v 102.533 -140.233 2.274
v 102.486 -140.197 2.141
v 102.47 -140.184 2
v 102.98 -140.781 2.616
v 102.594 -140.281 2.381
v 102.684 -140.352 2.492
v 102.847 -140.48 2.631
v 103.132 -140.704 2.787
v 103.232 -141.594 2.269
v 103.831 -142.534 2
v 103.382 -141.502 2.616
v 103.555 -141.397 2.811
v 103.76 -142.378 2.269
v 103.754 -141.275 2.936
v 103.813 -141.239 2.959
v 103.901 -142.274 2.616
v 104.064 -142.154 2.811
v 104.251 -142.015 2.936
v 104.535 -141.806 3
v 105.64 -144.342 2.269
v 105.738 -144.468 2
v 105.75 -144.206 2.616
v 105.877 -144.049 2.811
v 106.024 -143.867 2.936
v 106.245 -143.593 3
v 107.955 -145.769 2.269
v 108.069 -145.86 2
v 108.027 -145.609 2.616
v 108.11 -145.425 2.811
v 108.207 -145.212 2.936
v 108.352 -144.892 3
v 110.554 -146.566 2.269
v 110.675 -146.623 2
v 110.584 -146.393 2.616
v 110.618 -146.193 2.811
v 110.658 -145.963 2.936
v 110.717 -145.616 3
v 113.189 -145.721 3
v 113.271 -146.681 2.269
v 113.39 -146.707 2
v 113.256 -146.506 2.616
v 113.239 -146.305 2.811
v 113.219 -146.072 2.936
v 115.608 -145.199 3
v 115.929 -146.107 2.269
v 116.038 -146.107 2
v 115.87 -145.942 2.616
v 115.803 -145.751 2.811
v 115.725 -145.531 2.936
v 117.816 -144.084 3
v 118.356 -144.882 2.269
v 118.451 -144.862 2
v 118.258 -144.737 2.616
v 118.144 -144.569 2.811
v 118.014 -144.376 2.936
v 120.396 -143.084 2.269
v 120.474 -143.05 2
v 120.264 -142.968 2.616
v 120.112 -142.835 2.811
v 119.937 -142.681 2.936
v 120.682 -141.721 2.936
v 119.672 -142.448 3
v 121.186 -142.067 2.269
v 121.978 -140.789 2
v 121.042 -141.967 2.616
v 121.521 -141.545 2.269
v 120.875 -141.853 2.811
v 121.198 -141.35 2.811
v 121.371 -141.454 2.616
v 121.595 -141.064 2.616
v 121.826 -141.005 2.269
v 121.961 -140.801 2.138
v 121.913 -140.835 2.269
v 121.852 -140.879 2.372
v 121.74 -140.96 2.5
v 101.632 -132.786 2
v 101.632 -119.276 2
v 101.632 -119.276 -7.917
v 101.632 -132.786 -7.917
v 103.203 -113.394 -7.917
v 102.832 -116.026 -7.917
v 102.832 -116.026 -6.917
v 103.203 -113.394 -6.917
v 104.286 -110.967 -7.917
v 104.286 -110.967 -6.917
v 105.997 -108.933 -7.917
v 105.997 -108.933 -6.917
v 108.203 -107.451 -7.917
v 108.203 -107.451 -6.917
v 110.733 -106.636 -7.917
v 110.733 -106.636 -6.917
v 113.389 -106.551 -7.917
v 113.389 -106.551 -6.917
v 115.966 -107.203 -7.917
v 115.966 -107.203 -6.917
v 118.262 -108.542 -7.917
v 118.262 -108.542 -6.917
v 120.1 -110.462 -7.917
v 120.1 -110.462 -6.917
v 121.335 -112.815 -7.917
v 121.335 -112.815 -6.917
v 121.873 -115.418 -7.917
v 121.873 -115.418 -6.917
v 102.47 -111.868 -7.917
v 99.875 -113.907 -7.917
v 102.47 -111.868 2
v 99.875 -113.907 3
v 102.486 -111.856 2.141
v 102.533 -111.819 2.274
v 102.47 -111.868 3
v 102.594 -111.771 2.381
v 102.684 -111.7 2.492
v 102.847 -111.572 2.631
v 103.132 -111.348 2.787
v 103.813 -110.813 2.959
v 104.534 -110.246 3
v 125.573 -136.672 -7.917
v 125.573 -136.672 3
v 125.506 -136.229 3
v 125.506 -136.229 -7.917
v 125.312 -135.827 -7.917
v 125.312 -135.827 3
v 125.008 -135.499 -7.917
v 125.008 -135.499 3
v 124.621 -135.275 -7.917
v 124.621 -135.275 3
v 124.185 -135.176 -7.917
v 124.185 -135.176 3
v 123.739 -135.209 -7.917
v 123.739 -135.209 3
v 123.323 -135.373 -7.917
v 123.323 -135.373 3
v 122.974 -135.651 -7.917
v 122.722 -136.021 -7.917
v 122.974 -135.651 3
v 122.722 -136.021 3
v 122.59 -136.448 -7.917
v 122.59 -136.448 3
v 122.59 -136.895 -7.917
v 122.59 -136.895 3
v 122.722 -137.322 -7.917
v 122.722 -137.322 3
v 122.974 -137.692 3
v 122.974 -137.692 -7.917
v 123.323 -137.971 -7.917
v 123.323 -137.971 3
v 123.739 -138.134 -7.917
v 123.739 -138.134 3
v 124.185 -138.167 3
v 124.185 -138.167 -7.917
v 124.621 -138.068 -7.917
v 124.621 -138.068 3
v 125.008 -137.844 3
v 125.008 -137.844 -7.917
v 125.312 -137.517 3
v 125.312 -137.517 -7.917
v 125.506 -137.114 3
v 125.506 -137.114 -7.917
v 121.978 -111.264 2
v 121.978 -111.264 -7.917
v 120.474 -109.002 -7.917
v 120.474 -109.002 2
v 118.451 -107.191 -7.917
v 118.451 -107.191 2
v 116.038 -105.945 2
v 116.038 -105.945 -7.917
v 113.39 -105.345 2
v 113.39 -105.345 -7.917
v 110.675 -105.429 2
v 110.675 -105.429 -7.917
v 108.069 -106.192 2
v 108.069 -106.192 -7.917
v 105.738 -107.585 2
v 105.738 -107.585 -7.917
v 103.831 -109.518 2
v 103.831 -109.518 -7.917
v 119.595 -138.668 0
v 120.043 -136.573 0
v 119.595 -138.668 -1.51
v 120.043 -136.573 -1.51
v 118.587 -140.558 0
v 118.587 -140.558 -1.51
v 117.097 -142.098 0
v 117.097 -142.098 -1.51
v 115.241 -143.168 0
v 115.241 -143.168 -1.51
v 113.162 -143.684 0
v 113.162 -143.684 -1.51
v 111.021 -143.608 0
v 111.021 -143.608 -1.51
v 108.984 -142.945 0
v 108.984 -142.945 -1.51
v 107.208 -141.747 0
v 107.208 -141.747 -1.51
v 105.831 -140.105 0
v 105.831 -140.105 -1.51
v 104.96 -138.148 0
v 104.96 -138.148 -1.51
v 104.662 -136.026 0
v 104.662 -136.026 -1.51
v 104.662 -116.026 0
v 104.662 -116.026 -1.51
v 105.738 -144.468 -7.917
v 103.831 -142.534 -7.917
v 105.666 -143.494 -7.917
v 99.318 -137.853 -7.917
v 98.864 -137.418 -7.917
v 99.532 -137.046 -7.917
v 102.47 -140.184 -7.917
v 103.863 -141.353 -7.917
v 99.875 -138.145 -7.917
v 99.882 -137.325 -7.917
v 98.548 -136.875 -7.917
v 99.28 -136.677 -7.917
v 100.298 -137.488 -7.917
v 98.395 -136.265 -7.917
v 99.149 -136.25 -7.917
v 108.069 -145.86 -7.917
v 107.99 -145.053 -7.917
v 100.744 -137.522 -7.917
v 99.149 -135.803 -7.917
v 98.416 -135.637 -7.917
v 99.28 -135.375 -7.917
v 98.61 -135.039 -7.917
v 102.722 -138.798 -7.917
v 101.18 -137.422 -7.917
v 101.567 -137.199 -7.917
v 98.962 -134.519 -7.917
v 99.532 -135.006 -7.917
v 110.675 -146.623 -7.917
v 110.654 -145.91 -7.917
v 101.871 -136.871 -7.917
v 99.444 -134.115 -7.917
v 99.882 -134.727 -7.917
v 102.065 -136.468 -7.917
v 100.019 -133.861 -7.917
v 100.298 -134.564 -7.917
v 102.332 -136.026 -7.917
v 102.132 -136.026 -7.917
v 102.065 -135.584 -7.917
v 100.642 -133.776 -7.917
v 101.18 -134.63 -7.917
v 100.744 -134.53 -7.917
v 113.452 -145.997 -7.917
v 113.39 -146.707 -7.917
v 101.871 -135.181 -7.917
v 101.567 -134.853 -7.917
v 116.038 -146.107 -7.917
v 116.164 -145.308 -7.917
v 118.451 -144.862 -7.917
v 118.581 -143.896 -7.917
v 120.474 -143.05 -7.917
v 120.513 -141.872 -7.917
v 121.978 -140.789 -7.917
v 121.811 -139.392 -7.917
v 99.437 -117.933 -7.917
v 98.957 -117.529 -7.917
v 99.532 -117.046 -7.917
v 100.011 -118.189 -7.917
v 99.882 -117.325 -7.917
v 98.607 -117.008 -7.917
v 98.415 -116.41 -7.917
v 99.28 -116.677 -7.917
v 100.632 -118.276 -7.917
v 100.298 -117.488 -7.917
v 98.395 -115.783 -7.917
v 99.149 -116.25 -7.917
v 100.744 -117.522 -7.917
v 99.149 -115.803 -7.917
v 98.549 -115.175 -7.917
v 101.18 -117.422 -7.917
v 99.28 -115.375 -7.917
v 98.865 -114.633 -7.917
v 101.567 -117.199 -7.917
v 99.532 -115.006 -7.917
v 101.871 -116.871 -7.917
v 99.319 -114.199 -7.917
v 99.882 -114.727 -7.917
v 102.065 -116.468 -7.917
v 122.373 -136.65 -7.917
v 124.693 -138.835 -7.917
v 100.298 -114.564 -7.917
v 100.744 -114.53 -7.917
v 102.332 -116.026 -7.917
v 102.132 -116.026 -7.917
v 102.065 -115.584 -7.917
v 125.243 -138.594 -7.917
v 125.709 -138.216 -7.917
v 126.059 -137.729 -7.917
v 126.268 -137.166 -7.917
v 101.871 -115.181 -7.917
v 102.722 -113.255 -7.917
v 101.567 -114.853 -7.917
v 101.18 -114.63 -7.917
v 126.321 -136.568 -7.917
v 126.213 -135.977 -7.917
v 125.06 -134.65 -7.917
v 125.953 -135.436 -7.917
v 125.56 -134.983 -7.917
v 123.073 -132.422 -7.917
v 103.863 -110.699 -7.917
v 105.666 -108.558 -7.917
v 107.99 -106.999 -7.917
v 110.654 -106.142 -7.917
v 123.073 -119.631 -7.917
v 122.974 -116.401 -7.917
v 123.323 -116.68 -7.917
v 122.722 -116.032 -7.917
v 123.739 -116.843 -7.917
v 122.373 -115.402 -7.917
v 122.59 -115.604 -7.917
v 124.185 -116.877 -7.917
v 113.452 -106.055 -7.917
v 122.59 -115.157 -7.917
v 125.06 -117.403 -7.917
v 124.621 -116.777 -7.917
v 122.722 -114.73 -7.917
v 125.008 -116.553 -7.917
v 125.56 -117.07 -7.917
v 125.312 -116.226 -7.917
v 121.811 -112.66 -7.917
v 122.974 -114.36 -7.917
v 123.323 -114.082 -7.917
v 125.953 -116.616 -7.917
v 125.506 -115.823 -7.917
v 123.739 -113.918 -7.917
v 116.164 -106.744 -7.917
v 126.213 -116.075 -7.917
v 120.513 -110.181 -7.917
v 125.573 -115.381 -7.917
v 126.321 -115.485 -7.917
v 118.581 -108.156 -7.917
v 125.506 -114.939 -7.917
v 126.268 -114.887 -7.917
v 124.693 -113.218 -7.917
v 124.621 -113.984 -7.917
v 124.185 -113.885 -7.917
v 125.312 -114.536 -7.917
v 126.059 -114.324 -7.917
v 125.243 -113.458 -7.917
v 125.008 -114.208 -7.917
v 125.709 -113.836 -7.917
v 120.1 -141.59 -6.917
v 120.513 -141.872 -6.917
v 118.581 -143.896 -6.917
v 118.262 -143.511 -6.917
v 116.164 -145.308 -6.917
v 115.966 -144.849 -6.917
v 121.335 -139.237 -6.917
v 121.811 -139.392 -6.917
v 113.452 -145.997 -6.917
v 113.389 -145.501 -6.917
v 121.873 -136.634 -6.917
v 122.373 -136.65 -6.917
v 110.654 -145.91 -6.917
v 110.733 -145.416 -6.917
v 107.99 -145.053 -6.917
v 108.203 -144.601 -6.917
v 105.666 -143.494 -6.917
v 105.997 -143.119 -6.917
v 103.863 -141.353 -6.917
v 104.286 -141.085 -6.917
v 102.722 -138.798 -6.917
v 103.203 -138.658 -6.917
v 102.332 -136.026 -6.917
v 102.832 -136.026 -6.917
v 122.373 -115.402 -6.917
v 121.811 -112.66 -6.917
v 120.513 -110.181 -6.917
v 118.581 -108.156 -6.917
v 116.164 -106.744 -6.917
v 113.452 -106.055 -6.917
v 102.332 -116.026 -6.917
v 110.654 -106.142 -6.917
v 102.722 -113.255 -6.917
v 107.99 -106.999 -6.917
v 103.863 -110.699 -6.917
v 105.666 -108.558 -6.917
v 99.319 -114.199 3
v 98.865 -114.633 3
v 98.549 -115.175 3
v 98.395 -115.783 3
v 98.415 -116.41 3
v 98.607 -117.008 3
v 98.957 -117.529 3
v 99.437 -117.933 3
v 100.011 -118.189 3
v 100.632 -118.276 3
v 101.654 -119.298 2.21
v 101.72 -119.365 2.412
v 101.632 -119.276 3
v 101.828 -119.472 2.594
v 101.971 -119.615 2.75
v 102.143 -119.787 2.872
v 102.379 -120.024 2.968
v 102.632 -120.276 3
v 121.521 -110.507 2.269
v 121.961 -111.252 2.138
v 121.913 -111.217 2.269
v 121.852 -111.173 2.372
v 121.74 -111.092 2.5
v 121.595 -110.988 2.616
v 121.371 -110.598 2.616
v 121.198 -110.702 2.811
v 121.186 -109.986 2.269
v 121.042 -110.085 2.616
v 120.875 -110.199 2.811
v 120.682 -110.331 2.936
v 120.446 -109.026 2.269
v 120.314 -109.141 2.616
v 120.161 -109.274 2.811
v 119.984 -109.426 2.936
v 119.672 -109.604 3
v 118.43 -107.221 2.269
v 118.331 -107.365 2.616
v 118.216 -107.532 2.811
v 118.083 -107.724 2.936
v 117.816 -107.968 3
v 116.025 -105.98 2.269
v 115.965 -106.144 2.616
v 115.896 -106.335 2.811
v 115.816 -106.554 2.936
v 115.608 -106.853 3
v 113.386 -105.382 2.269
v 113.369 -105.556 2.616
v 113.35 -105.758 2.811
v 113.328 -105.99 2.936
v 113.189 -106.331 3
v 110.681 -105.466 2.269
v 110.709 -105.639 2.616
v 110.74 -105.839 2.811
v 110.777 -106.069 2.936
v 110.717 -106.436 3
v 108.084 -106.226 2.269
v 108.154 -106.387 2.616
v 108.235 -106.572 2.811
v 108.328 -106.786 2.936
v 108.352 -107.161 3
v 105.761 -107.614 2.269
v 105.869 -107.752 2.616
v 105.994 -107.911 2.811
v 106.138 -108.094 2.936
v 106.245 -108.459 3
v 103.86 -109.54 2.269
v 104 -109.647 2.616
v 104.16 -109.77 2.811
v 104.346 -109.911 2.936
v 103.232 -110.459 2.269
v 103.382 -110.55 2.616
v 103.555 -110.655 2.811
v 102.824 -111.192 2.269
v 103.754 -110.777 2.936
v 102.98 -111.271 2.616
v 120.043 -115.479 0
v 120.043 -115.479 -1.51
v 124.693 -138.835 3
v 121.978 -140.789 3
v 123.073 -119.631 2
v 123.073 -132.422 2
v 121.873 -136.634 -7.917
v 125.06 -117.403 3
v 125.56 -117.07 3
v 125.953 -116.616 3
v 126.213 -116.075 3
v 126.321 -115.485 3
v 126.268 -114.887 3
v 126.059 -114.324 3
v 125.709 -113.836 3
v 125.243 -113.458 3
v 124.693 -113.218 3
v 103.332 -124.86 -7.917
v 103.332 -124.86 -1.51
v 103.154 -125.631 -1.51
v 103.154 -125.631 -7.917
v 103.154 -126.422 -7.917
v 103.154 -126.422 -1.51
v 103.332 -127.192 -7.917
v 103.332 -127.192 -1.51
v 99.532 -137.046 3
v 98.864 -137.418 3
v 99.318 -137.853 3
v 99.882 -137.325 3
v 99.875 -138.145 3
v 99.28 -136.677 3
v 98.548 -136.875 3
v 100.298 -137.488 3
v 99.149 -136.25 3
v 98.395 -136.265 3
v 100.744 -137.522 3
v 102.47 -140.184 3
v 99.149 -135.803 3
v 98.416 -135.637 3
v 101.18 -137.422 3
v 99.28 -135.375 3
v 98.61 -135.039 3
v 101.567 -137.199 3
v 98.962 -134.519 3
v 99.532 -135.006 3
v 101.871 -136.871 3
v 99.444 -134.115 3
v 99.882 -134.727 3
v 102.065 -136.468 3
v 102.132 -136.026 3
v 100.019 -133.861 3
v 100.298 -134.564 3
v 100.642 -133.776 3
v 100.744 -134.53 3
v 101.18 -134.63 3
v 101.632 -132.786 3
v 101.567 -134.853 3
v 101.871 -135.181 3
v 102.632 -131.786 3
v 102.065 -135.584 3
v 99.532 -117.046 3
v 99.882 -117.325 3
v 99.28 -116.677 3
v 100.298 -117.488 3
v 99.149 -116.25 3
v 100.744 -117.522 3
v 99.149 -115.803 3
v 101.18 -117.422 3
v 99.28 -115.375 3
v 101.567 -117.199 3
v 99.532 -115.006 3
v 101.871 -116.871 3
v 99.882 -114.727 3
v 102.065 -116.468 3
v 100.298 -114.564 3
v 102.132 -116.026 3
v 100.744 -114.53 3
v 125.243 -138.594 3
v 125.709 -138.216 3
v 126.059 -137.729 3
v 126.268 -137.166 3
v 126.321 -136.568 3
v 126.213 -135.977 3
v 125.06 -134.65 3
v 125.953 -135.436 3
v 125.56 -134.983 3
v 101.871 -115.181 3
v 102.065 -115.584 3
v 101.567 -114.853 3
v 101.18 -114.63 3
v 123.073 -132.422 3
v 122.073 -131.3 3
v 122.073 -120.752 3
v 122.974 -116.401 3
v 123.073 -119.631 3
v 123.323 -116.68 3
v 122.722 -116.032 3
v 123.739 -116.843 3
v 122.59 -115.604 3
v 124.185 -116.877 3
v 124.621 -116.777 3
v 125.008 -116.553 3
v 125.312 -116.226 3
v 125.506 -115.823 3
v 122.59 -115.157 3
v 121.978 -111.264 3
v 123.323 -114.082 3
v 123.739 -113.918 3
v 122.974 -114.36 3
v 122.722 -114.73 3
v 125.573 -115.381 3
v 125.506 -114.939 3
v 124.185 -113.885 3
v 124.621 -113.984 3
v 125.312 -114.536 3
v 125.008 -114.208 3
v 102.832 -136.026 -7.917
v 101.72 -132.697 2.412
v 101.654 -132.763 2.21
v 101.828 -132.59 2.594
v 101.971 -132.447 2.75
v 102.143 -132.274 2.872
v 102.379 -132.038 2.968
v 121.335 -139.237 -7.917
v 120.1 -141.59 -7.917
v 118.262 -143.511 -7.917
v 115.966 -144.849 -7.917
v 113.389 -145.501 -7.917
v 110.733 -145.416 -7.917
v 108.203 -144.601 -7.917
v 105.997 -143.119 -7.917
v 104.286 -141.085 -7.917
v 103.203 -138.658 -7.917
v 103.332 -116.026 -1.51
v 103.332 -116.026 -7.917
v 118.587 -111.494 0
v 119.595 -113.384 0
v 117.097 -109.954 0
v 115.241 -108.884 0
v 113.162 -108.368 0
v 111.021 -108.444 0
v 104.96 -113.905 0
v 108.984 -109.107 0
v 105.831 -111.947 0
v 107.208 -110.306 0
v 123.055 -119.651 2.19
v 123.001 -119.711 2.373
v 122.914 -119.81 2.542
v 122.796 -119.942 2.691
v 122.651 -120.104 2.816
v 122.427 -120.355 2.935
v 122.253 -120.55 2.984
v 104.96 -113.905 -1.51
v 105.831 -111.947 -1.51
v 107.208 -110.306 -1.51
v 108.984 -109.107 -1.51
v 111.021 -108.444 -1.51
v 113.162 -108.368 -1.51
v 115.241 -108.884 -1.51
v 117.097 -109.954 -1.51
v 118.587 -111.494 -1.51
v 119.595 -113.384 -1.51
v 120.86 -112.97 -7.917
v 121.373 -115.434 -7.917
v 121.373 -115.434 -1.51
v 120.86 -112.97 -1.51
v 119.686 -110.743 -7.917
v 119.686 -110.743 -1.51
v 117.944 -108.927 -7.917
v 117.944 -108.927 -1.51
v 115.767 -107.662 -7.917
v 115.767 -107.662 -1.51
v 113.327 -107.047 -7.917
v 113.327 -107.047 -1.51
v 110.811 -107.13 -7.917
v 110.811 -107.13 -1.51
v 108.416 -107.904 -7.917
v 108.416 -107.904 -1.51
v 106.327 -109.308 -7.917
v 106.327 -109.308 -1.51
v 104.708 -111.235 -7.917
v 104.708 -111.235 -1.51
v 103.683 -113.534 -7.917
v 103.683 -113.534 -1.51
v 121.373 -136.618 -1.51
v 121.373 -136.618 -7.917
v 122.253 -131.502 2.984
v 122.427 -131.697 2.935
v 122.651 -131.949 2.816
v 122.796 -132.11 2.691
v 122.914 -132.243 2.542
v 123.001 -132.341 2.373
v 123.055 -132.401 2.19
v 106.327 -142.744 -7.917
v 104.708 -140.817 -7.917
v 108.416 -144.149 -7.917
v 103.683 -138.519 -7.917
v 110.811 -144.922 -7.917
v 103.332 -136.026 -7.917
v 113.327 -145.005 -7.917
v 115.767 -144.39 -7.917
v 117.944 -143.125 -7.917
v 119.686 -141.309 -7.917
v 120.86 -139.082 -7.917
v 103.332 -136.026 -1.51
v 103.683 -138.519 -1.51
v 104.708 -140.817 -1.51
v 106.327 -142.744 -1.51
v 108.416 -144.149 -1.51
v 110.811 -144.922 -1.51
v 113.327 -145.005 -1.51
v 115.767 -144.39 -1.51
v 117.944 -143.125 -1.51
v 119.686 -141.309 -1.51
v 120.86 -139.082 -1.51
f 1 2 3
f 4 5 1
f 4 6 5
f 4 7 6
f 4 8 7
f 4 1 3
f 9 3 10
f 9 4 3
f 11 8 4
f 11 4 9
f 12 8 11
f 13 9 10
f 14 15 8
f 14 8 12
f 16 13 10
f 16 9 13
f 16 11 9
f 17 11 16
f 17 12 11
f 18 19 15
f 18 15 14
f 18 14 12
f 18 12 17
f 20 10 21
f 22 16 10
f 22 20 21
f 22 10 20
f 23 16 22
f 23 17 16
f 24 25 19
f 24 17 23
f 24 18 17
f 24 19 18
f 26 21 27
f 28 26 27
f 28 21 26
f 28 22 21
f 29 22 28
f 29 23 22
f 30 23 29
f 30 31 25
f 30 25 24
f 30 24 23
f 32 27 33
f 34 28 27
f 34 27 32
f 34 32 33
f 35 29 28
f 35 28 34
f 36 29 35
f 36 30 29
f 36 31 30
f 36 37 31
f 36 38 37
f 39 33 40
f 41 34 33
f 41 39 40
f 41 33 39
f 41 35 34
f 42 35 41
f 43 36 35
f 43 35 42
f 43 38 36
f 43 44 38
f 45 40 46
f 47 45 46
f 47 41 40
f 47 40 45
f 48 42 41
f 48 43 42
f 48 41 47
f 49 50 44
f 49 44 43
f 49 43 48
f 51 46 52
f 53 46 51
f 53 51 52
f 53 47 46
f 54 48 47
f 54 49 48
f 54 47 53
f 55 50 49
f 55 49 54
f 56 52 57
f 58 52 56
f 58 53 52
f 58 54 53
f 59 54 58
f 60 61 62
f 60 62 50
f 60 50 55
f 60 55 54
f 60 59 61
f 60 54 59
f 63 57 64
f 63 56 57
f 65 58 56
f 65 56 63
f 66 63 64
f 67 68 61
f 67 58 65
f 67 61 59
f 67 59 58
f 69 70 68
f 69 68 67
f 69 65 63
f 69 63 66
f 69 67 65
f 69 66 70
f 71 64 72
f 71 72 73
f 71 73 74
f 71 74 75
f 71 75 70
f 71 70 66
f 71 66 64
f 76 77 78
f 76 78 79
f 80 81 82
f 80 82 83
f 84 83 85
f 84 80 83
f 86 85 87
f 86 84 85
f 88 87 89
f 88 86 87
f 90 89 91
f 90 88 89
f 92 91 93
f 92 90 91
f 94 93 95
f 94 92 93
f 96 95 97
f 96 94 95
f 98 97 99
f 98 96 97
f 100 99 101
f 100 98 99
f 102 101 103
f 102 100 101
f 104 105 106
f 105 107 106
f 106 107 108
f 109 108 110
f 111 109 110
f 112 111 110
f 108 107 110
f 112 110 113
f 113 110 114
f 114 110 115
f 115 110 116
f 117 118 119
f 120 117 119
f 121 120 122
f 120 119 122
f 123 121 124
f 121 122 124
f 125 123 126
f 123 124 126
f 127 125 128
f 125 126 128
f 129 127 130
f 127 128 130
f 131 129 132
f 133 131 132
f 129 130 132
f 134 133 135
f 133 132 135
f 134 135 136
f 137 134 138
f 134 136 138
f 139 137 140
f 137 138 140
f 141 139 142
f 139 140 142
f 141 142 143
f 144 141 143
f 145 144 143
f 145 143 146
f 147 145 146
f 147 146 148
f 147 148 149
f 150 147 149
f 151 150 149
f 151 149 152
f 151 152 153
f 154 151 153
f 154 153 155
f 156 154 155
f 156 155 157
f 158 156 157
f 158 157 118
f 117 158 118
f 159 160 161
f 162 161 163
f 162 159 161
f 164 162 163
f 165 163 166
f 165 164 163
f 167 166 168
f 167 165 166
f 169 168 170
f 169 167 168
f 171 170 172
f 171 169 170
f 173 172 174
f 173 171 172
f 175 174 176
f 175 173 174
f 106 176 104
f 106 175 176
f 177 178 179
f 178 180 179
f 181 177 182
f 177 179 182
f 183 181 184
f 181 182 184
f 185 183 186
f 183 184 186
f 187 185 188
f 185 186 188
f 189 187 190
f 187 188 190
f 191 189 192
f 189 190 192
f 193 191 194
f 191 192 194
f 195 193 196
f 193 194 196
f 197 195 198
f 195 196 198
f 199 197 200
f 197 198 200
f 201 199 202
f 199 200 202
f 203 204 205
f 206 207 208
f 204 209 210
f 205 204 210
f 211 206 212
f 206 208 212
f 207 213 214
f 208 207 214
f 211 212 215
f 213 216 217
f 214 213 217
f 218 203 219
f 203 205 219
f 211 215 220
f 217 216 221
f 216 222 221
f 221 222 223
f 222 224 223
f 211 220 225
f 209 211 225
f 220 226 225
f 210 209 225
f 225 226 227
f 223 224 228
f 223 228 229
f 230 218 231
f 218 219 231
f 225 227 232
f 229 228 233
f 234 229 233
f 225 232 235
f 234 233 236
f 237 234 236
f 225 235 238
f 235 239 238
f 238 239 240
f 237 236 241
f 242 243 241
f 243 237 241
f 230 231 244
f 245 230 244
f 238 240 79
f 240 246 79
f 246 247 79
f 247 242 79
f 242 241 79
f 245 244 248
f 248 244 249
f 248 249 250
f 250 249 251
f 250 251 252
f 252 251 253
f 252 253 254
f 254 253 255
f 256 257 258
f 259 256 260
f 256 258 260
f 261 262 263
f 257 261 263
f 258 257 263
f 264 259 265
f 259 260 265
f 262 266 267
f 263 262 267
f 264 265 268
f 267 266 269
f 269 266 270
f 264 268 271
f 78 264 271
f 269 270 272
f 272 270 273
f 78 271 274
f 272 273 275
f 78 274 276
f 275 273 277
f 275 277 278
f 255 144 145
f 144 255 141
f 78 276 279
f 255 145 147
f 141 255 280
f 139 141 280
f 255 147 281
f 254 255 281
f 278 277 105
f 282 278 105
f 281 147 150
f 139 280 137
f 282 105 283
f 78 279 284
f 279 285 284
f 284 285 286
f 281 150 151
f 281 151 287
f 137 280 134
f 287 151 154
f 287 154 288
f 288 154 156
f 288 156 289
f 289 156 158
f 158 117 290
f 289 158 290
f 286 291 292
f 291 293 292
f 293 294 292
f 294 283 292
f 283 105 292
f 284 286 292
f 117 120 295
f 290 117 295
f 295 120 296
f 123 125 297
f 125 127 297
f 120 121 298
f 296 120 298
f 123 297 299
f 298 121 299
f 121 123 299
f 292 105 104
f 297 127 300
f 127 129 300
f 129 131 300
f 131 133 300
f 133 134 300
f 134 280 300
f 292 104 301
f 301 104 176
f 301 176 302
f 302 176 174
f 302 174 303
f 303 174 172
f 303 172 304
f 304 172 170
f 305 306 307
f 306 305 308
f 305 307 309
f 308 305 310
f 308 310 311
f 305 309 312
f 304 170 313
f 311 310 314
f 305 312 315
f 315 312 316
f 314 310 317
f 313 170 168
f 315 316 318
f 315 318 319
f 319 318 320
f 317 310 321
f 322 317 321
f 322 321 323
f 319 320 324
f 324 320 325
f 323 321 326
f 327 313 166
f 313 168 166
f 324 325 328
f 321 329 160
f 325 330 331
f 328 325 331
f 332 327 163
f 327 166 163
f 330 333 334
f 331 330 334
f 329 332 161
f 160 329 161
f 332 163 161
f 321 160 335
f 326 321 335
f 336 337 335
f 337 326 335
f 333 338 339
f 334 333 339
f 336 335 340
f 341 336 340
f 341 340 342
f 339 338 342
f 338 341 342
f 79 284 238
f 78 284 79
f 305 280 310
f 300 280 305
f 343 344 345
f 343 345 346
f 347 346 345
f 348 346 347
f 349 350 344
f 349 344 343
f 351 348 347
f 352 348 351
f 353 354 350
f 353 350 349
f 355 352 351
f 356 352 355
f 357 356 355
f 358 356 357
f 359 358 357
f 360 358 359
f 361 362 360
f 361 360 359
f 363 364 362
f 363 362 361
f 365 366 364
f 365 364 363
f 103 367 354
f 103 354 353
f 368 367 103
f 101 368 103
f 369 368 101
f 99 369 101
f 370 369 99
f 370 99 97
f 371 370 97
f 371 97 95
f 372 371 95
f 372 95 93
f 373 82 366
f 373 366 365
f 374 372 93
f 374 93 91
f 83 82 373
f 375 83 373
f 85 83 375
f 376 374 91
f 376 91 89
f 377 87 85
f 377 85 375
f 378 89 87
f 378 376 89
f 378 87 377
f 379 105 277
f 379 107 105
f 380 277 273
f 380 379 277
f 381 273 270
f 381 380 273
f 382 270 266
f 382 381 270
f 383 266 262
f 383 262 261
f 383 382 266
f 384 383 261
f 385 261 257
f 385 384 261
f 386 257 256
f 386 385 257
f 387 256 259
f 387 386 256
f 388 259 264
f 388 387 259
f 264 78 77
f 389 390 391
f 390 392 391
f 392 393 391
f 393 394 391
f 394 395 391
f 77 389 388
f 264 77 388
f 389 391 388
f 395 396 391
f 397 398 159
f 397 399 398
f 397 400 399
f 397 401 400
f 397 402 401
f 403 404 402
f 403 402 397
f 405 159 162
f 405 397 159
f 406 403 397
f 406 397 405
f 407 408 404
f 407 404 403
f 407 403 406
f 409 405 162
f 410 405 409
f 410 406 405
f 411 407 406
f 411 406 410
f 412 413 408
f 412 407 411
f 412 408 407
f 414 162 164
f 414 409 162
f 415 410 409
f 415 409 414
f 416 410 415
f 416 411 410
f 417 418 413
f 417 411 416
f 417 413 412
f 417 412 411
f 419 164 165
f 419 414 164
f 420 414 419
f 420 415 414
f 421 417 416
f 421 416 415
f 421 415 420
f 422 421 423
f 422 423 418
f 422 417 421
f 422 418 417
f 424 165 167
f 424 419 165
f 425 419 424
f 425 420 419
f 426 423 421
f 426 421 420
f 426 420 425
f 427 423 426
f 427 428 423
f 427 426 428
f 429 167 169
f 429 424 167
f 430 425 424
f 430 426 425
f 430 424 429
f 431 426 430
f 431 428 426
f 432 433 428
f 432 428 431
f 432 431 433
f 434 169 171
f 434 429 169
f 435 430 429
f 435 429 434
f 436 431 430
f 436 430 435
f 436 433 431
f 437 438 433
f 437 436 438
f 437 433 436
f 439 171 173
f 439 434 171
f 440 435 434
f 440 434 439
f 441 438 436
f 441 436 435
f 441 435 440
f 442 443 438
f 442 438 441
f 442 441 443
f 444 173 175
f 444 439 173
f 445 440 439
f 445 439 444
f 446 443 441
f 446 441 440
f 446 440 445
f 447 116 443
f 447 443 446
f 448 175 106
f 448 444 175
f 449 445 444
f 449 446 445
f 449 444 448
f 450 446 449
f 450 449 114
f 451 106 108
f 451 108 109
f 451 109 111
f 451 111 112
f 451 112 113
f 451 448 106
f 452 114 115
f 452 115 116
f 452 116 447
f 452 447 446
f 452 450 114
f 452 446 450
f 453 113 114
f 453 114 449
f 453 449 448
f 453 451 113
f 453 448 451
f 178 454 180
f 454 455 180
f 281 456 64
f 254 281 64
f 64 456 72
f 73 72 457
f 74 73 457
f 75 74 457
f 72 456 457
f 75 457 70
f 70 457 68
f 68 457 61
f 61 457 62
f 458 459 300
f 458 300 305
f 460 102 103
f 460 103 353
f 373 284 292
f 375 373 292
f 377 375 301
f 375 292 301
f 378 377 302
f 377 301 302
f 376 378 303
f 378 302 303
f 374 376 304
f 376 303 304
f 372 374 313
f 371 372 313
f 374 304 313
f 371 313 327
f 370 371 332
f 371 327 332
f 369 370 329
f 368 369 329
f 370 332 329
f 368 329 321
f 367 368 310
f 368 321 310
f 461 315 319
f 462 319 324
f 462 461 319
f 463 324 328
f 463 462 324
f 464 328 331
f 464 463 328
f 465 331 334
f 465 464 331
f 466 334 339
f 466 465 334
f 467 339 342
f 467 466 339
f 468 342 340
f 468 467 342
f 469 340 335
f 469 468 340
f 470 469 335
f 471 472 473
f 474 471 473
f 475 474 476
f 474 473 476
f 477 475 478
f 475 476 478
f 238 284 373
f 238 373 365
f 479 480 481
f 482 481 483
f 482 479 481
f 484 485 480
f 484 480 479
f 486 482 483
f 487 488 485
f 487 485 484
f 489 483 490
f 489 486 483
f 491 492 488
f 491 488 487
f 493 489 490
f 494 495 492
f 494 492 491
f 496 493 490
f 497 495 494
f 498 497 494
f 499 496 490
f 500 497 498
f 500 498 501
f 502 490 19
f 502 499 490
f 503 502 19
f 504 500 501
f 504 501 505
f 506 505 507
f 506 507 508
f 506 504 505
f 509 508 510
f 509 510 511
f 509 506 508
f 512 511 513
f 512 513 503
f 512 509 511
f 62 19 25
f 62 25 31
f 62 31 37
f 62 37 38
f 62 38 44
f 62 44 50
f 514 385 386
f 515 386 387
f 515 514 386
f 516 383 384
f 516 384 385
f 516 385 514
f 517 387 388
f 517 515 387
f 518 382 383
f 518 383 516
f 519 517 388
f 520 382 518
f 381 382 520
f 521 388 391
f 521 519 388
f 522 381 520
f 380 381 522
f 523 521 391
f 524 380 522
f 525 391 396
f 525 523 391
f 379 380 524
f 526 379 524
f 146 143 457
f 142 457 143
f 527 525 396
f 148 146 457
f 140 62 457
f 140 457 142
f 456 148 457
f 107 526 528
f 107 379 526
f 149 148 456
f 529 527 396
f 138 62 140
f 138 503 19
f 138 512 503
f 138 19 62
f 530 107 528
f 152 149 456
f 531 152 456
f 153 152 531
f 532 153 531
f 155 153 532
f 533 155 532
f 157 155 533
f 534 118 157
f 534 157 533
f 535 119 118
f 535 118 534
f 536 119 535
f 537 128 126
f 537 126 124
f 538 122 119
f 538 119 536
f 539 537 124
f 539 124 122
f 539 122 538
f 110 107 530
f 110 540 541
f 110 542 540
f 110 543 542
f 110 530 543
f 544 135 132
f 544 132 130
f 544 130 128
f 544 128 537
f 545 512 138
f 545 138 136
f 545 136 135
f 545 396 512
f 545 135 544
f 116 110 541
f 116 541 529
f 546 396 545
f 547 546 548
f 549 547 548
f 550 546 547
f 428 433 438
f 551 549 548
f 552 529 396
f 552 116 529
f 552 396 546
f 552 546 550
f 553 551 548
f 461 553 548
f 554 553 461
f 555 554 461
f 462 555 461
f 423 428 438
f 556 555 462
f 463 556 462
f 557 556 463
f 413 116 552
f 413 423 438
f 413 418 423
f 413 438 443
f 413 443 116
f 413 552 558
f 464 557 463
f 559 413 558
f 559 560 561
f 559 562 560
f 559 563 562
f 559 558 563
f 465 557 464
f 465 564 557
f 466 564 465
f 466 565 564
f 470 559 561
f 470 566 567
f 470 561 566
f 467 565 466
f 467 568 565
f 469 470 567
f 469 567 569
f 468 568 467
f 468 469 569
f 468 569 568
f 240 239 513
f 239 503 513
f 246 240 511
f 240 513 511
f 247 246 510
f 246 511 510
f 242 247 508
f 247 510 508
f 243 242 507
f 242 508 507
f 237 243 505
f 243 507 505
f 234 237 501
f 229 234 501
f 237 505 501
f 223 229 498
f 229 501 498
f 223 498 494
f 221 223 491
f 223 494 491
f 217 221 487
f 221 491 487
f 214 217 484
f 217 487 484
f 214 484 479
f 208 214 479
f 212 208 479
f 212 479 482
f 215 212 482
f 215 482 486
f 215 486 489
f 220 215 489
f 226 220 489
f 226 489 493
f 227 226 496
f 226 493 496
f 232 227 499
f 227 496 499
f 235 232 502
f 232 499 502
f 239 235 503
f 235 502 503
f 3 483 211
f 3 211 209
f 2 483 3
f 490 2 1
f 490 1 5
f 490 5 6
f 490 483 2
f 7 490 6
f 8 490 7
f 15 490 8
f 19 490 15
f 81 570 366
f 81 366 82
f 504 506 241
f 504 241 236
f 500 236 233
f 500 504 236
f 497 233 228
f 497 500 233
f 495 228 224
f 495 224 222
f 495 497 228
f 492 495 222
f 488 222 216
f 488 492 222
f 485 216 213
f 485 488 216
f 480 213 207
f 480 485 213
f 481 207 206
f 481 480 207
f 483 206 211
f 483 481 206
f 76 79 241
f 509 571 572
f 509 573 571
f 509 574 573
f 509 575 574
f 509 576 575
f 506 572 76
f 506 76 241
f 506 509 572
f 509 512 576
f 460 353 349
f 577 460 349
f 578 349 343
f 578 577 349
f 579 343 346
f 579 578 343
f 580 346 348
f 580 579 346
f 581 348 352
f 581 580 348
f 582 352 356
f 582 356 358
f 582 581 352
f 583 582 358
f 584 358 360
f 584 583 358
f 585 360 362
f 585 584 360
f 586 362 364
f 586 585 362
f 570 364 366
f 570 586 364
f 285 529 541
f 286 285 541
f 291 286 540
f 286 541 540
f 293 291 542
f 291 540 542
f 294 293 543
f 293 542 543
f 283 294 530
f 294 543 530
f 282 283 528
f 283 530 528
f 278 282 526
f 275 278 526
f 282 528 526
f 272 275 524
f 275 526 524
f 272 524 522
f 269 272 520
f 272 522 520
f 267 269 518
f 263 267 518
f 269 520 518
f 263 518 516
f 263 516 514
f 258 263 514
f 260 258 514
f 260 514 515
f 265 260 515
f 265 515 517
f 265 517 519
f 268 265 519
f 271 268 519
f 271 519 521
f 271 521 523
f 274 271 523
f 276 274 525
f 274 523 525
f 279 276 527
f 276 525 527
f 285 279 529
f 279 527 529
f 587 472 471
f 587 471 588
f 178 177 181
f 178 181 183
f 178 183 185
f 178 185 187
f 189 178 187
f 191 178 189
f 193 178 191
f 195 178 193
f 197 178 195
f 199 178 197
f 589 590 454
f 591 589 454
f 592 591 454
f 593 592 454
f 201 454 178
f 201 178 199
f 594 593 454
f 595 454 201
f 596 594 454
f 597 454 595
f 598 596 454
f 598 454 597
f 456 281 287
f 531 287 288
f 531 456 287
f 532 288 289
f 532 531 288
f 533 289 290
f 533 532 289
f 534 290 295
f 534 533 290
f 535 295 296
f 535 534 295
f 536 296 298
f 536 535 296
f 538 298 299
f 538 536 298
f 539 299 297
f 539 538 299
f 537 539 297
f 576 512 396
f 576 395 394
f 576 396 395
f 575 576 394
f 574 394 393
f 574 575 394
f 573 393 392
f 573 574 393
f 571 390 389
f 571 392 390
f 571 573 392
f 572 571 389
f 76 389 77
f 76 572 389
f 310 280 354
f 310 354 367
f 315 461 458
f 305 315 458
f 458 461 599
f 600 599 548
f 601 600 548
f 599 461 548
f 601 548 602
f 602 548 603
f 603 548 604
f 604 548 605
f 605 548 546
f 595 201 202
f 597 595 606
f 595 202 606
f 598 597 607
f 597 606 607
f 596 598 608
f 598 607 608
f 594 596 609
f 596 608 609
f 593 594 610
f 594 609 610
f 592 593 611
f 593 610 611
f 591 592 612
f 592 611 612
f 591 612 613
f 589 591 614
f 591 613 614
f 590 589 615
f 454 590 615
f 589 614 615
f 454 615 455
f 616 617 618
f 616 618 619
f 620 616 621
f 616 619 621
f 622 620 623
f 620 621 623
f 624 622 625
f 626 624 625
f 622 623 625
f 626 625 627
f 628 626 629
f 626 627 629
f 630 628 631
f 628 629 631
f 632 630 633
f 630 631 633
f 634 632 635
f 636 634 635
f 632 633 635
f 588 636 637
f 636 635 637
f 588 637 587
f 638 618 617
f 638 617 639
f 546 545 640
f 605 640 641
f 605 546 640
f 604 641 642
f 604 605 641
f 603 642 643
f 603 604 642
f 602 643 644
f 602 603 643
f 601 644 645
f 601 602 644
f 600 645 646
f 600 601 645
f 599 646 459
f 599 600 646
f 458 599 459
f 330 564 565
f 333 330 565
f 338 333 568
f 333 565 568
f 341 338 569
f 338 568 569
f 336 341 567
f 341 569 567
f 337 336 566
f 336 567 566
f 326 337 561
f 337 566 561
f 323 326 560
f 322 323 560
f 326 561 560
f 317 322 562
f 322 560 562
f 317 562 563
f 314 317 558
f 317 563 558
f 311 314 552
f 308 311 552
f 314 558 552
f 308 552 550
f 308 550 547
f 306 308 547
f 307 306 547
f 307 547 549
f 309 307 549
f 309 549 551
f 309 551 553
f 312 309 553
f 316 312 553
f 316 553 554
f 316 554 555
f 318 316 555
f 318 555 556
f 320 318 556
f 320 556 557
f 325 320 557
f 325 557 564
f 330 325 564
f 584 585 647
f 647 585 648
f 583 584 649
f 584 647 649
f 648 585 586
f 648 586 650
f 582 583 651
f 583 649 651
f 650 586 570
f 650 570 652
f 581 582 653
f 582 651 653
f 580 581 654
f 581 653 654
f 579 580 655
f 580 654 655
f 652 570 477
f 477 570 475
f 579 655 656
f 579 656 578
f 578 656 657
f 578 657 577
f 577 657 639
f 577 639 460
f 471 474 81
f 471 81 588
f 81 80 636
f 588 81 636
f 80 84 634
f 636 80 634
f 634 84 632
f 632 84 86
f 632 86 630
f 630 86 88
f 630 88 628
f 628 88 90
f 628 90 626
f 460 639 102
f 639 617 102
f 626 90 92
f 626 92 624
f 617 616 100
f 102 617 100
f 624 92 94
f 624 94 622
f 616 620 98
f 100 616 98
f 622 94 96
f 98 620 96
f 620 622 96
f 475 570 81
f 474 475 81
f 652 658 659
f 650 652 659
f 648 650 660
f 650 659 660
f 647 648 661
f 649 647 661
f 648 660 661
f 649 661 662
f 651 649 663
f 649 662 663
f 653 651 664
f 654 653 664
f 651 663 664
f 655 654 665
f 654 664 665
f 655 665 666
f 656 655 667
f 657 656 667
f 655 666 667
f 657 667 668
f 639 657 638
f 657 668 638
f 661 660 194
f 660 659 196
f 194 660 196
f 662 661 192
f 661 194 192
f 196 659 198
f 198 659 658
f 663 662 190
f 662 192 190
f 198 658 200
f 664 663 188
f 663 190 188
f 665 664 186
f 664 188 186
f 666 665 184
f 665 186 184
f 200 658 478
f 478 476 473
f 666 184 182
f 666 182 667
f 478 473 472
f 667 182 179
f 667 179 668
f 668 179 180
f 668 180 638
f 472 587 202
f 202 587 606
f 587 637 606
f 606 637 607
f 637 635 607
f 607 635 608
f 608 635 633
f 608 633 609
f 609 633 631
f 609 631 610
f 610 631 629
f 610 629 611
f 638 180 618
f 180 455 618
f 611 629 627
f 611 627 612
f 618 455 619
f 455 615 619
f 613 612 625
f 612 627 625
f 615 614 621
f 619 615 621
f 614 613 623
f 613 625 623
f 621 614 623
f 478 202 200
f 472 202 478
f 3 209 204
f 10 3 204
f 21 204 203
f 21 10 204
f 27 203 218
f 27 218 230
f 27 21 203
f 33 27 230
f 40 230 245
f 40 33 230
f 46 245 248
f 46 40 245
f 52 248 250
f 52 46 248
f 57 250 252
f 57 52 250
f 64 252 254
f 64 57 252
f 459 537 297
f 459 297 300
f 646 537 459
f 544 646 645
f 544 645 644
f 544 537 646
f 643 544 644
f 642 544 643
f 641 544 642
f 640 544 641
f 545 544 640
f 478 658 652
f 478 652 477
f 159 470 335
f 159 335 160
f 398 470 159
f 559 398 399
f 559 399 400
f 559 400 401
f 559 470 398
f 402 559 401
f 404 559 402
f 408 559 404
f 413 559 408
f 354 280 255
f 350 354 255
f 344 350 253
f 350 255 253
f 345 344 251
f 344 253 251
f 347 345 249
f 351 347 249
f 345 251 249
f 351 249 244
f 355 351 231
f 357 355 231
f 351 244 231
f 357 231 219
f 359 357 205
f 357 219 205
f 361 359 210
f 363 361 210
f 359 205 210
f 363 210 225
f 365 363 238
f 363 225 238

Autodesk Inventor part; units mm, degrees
ref_plane "Work Plane1" through (0, 0, 0) normal (0, 0, 1) x (1, 0, 0)
sketch "Sketch1" plane through (0, 0, 0) normal (0, 0, 1) x (1, 0, 0)
  line L0 (119.8428, -136.5657) -> (119.8428, -115.4866) projected
  arc A0 (119.8428, -115.4866) -> (104.8622, -116.0261) centre (112.3622, -116.0261) ccw projected
  line L1 (104.8622, -136.0261) -> (104.8622, -116.0261) projected
  arc A1 (104.8622, -136.0261) -> (119.8428, -136.5657) centre (112.3622, -136.0261) ccw projected
  circle A2 centre (117.3428, -116.0541) radius 0.5 projected
  circle A3 centre (106.6428, -124.9791) radius 0.5 projected
  circle A4 centre (106.6428, -127.5191) radius 0.5 projected
  circle A5 centre (117.3428, -136.0541) radius 0.5 projected
  arc A6 (103.3319, -124.86) -> (103.3319, -127.1923) centre (106.6319, -126.0261) ccw projected
  line L2 (103.3319, -124.86) -> (103.3319, -116.0261) projected
  arc A7 (121.3731, -115.4341) -> (103.3319, -116.0261) centre (112.3622, -116.0261) ccw projected
  line L3 (121.3731, -115.4341) -> (121.3731, -136.6182) projected
  arc A8 (103.3319, -136.0261) -> (121.3731, -136.6182) centre (112.3622, -136.0261) ccw projected
  line L4 (103.3319, -136.0261) -> (103.3319, -127.1923) projected
  arc A9 (121.8731, -115.4179) -> (102.8319, -116.0261) centre (112.3622, -116.0261) ccw projected
  line L5 (102.8319, -116.0261) -> (102.8319, -136.0261) projected
  arc A10 (102.8319, -136.0261) -> (121.8731, -136.6344) centre (112.3622, -136.0261) ccw projected
  line L6 (121.8731, -136.6344) -> (121.8731, -115.4179) projected
  point P0 (0, 0)
  point P1 (107.9, -107.4721)
  point P2 (107.9, -127.4721)
extrude "Extrusion1" add sketch "Sketch1" along normal blind 3 contours A1 L1 A0 L0 | A2 | A3 | A4 | A5
ref_plane "Work Plane3" through (97.1697, -138.2024, -7.9168) normal (0, 0, 1) x (1, 0, 0)
ref_plane "Work Plane4" through (100.4, -134.9721, -1.51) normal (0, 0, -1) x (0, 1, 0)
sketch "Sketch4" plane through (0, 0, 3) normal (0, 0, 1) x (1, 0, 0)
  line L0 (103.3319, -124.86) -> (103.3319, -116.0261)
  line L1 (103.3319, -136.0261) -> (103.3319, -127.1923)
  arc A0 (103.3319, -136.0261) -> (121.3731, -136.6182) centre (112.3622, -136.0261) ccw
  line L2 (121.3731, -115.4341) -> (121.3731, -136.6182)
  arc A1 (121.3731, -115.4341) -> (103.3319, -116.0261) centre (112.3622, -116.0261) ccw
  line L3 (103.3319, -124.86) -> (103.3319, -127.1923)
  circle A2 centre (112.3622, -136.0261) radius 6.35
  line L4 (119.8428, -136.5657) -> (119.8428, -115.4866)
  arc A3 (119.8428, -115.4866) -> (104.8622, -116.0261) centre (112.3622, -116.0261) ccw
  line L5 (104.8622, -116.0261) -> (104.8622, -136.0261)
  arc A4 (104.8622, -136.0261) -> (119.8428, -136.5657) centre (112.3622, -136.0261) ccw
  point P0 (0, 0)
extrude "Extrusion4" add sketch "Sketch4" against normal up to surface (4.51 mm away) contours L0 A1 L2 A0 L1 L3
sketch "Sketch5" plane through (121.3731, -136.6182, -1.51) normal (0, 0, -1) x (-1, 0, 0)
  line L0 (16.5109, 20.5921) -> (16.5109, 13.6117) projected
  line L1 (16.5109, 0.5921) -> (16.5109, 20.5921) projected
  arc A0 (1.5303, 0.0526) -> (16.5109, 0.5921) centre (9.0109, 0.5921) ccw projected
  line L2 (1.5303, 0.0526) -> (1.5303, 21.1316) projected
  arc A1 (16.5109, 20.5921) -> (1.5303, 21.1316) centre (9.0109, 20.5921) ccw projected
  line L3 (1.3303, 21.1388) -> (1.3303, 0.0454)
  arc A2 (1.3303, 0.0454) -> (16.7109, 0.5921) centre (9.0109, 0.5921) ccw
  line L4 (16.7109, 0.5921) -> (16.7109, 20.5921)
  arc A3 (16.7109, 20.5921) -> (1.3303, 21.1388) centre (9.0109, 20.5921) ccw
  point P0 (121.3731, 136.6182)
  dimension "d10" = 0.2
extrude "Extrusion5" cut sketch "Sketch5" against normal up to surface (1.51 mm away)
ref_plane "Work Plane5" through (93.9197, -138.2024, -7.9168) normal (0, 0, 1) x (1, 0, 0)
ref_plane "Work Plane6" through (93.9197, -138.2024, -7.9168) normal (0, 0, 1) x (1, 0, 0)
sketch "Sketch10" plane through (0, 0, 3) normal (0, 0, 1) x (1, 0, 0)
  line L0 (103.3319, -116.0261) -> (103.3319, -136.0261) projected
  arc A0 (103.3319, -124.86) -> (103.3319, -127.1923) centre (106.6319, -126.0261) ccw projected
  point P0 (0, 0)
  point P1 (103.3319, -135.2618)
extrude "Extrusion10" add sketch "Sketch10" against normal up to surface (4.51 mm away)
sketch "Sketch11" plane through (0, 0, 3) normal (0, 0, 1) x (1, 0, 0)
  circle A0 centre (124.0731, -115.3807) radius 1.5 projected
  circle A1 centre (100.6319, -116.0261) radius 1.5 projected
  circle A2 centre (124.0731, -136.6716) radius 1.5 projected
  circle A3 centre (100.6319, -136.0261) radius 1.5 projected
  line L0 (101.6319, -119.276) -> (100.632, -118.2761) projected
  line L1 (101.6319, -119.276) -> (101.6319, -132.7858) projected
  line L2 (101.6319, -132.7858) -> (100.6415, -133.7762) projected
  arc A4 (100.6415, -133.7762) -> (99.8748, -138.1449) centre (100.6319, -136.0261) ccw projected
  line L3 (99.8748, -138.1449) -> (102.4702, -140.1841) projected
  arc A5 (102.4702, -140.1841) -> (121.9777, -140.7888) centre (112.3622, -136.0261) ccw projected
  line L4 (124.6926, -138.8347) -> (121.9777, -140.7888) projected
  arc A6 (124.6926, -138.8347) -> (125.0601, -134.6496) centre (124.0731, -136.6716) ccw projected
  line L5 (125.0601, -134.6496) -> (123.0731, -132.4216) projected
  line L6 (123.0731, -132.4216) -> (123.0731, -119.6307) projected
  line L7 (125.0601, -117.4026) -> (123.0731, -119.6307) projected
  arc A7 (125.0601, -117.4026) -> (124.6926, -113.2176) centre (124.0731, -115.3807) ccw projected
  line L8 (124.6926, -113.2176) -> (121.9777, -111.2635) projected
  arc A8 (121.9777, -111.2635) -> (102.4702, -111.8682) centre (112.3622, -116.0261) ccw projected
  line L9 (99.8748, -113.9074) -> (102.4702, -111.8682) projected
  arc A9 (99.8748, -113.9074) -> (100.6319, -118.2761) centre (100.6319, -116.0261) ccw projected
  arc A10 (102.3319, -136.0261) -> (122.3731, -136.6502) centre (112.3622, -136.0261) ccw projected
  line L10 (102.3319, -136.0261) -> (102.3319, -116.0261) projected
  arc A11 (122.3731, -115.4021) -> (102.3319, -116.0261) centre (112.3622, -116.0261) ccw projected
  line L11 (122.3731, -115.4021) -> (122.3731, -136.6502) projected
  line L12 (102.3319, -136.0261) -> (102.3319, -116.0261) projected
  arc A12 (102.3319, -136.0261) -> (122.3731, -136.6502) centre (112.3622, -136.0261) ccw projected
  line L13 (122.3731, -115.4021) -> (122.3731, -136.6502) projected
  arc A13 (122.3731, -115.4021) -> (102.3319, -116.0261) centre (112.3622, -116.0261) ccw projected
  line L14 (102.8319, -116.0261) -> (102.8319, -136.0261) projected
  arc A14 (121.8731, -115.4179) -> (102.8319, -116.0261) centre (112.3622, -116.0261) ccw projected
  line L15 (121.8731, -136.6344) -> (121.8731, -115.4179) projected
  arc A15 (102.8319, -136.0261) -> (121.8731, -136.6344) centre (112.3622, -136.0261) ccw projected
  arc A16 (121.8731, -115.4179) -> (102.8319, -116.0261) centre (112.3622, -116.0261) ccw projected
  line L16 (102.8319, -116.0261) -> (102.8319, -136.0261) projected
  arc A17 (102.8319, -136.0261) -> (121.8731, -136.6344) centre (112.3622, -136.0261) ccw projected
  line L17 (121.8731, -136.6344) -> (121.8731, -115.4179) projected
  arc A18 (103.3319, -124.86) -> (103.3319, -127.1923) centre (106.6319, -126.0261) ccw projected
  line L18 (103.3319, -124.86) -> (103.3319, -116.0261) projected
  arc A19 (121.3731, -115.4341) -> (103.3319, -116.0261) centre (112.3622, -116.0261) ccw projected
  line L19 (121.3731, -115.4341) -> (121.3731, -136.6182) projected
  arc A20 (103.3319, -136.0261) -> (121.3731, -136.6182) centre (112.3622, -136.0261) ccw projected
  line L20 (103.3319, -136.0261) -> (103.3319, -127.1923) projected
  line L21 (101.6319, -119.276) -> (101.6319, -132.7858)
  line L22 (101.6319, -132.7858) -> (100.6415, -133.7762)
  circle A21 centre (100.6319, -136.0261) radius 2.25
  line L23 (99.8748, -138.1449) -> (102.4702, -140.1841)
  circle A22 centre (112.3622, -136.0261) radius 10.7303
  line L24 (121.9777, -140.7888) -> (124.6926, -138.8347)
  circle A23 centre (124.0731, -136.6716) radius 2.25
  line L25 (123.0731, -132.4216) -> (125.0601, -134.6496)
  line L26 (123.0731, -132.4216) -> (123.0731, -119.6307)
  line L27 (123.0731, -119.6307) -> (125.0601, -117.4026)
  line L28 (124.6926, -113.2176) -> (121.9777, -111.2635)
  circle A24 centre (112.3622, -116.0261) radius 10.7303
  line L29 (102.4702, -111.8682) -> (99.8748, -113.9074)
  circle A25 centre (100.6319, -116.0261) radius 2.25
  line L30 (100.6319, -118.2761) -> (101.6319, -119.276)
  circle A26 centre (124.0731, -115.3807) radius 2.25
  point P0 (0, 0)
ref_plane "Work Plane8" through (98.3819, -146.7565, -7.9168) normal (0, 0, 1) x (1, 0, 0)
extrude "Extrusion11" add sketch "Sketch11" against normal up to surface (10.9168 mm away) contours A0 A24 A26 A7 | A0 A24 A26 L11 A11 | A26 A11 A25 A24 A8 | A24 L8 A26 | A26 L7 L6 L5 A23 A22 L11 A24 | A24 L11 A26 | A26 A14 A25 A11 | A11 L11 A26 L15 A14 | A24 L15 A26 L11 | L11 A22 L15 A24 | A24 A25 L9 | A25 A14 L14 L10 A11 | A11 L10 A25 A24 A1 | A26 L15 A24 L19 A19 L18 L14 A25 A14 | A14 L15 A26 | A22 A23 L11 | L11 A23 L15 A22 | L15 A22 L19 A24 | A25 A24 A1 A9 | A25 L14 A14 | A23 A22 A2 A10 L11 | L11 A10 A23 A15 L15 | A23 A6 A22 A2 | L15 A23 A15 A21 L14 A22 L20 A20 L19 | A25 A24 L10 A22 A21 L2 L1 L0 | A25 L14 A24 L10 | L10 A24 A25 | L15 A15 A23 | A24 L14 A22 L10 | A23 A22 A5 A21 A10 | A10 A21 A15 A23 | A22 L14 A21 L10 | L10 A21 A22 | A24 L18 A18 L20 A22 L14 | A21 A22 A3 L10 A10 | A10 L10 A21 L14 A15 | A23 L4 A22 | A15 L14 A21 | A21 A22 A3 A4 | A22 L3 A21
sketch "Sketch13" plane through (101.6319, -132.7858, -7.9168) normal (0, 0, -1) x (-1, 0, 0)
  line L0 (-1.7, 5.5934) -> (-1.7, -3.2404) projected
  line L1 (-1.7, 5.5934) -> (-1.7, 7.9258)
  arc A0 (-19.7412, -3.8325) -> (-1.7, -3.2404) centre (-10.7303, -3.2404) ccw projected
  line L2 (-19.7412, 17.3517) -> (-19.7412, -3.8325) projected
  arc A1 (-1.7, 16.7596) -> (-19.7412, 17.3517) centre (-10.7303, 16.7596) ccw projected
  line L3 (-1.7, 7.9258) -> (-1.7, 16.7596) projected
  line L4 (-1.2, -3.2404) -> (-1.2, 5.5934)
  line L5 (-1.2, 5.5934) -> (-1.2, 7.9258)
  line L6 (-1.2, 7.9258) -> (-1.2, 16.7596)
  arc A2 (-1.2, 16.7596) -> (-20.2412, 17.3679) centre (-10.7303, 16.7596) ccw
  line L7 (-20.2412, 17.3679) -> (-20.2412, -3.8486)
  arc A3 (-20.2412, -3.8486) -> (-1.2, -3.2404) centre (-10.7303, -3.2404) ccw
  line L8 (-0.7, 5.5934) -> (-0.7, -3.2404)
  arc A4 (-20.7412, -3.8644) -> (-0.7, -3.2404) centre (-10.7303, -3.2404) ccw
  line L9 (-20.7412, -3.8644) -> (-20.7412, 17.3837)
  arc A5 (-0.7, 16.7596) -> (-20.7412, 17.3837) centre (-10.7303, 16.7596) ccw
  line L10 (-0.7, 16.7596) -> (-0.7, 7.9258)
  line L11 (-0.7, 7.9258) -> (-0.7, 5.5934)
  point P0 (101.6319, 132.7858)
  dimension "d31" = 0.5
  dimension "d32" = 0.5
extrude "Extrusion12" cut sketch "Sketch13" against normal blind 1 contours L8 A4 L9 A5 L10 L11
fillet "Fillet4" radius 1 4 edges at (112.0298, -105.301, 3) (101.6319, -126.0309, 3) (112.0298, -146.7513, 3) (123.0731, -126.0261, 3)
properties part number "battery_case_top"
